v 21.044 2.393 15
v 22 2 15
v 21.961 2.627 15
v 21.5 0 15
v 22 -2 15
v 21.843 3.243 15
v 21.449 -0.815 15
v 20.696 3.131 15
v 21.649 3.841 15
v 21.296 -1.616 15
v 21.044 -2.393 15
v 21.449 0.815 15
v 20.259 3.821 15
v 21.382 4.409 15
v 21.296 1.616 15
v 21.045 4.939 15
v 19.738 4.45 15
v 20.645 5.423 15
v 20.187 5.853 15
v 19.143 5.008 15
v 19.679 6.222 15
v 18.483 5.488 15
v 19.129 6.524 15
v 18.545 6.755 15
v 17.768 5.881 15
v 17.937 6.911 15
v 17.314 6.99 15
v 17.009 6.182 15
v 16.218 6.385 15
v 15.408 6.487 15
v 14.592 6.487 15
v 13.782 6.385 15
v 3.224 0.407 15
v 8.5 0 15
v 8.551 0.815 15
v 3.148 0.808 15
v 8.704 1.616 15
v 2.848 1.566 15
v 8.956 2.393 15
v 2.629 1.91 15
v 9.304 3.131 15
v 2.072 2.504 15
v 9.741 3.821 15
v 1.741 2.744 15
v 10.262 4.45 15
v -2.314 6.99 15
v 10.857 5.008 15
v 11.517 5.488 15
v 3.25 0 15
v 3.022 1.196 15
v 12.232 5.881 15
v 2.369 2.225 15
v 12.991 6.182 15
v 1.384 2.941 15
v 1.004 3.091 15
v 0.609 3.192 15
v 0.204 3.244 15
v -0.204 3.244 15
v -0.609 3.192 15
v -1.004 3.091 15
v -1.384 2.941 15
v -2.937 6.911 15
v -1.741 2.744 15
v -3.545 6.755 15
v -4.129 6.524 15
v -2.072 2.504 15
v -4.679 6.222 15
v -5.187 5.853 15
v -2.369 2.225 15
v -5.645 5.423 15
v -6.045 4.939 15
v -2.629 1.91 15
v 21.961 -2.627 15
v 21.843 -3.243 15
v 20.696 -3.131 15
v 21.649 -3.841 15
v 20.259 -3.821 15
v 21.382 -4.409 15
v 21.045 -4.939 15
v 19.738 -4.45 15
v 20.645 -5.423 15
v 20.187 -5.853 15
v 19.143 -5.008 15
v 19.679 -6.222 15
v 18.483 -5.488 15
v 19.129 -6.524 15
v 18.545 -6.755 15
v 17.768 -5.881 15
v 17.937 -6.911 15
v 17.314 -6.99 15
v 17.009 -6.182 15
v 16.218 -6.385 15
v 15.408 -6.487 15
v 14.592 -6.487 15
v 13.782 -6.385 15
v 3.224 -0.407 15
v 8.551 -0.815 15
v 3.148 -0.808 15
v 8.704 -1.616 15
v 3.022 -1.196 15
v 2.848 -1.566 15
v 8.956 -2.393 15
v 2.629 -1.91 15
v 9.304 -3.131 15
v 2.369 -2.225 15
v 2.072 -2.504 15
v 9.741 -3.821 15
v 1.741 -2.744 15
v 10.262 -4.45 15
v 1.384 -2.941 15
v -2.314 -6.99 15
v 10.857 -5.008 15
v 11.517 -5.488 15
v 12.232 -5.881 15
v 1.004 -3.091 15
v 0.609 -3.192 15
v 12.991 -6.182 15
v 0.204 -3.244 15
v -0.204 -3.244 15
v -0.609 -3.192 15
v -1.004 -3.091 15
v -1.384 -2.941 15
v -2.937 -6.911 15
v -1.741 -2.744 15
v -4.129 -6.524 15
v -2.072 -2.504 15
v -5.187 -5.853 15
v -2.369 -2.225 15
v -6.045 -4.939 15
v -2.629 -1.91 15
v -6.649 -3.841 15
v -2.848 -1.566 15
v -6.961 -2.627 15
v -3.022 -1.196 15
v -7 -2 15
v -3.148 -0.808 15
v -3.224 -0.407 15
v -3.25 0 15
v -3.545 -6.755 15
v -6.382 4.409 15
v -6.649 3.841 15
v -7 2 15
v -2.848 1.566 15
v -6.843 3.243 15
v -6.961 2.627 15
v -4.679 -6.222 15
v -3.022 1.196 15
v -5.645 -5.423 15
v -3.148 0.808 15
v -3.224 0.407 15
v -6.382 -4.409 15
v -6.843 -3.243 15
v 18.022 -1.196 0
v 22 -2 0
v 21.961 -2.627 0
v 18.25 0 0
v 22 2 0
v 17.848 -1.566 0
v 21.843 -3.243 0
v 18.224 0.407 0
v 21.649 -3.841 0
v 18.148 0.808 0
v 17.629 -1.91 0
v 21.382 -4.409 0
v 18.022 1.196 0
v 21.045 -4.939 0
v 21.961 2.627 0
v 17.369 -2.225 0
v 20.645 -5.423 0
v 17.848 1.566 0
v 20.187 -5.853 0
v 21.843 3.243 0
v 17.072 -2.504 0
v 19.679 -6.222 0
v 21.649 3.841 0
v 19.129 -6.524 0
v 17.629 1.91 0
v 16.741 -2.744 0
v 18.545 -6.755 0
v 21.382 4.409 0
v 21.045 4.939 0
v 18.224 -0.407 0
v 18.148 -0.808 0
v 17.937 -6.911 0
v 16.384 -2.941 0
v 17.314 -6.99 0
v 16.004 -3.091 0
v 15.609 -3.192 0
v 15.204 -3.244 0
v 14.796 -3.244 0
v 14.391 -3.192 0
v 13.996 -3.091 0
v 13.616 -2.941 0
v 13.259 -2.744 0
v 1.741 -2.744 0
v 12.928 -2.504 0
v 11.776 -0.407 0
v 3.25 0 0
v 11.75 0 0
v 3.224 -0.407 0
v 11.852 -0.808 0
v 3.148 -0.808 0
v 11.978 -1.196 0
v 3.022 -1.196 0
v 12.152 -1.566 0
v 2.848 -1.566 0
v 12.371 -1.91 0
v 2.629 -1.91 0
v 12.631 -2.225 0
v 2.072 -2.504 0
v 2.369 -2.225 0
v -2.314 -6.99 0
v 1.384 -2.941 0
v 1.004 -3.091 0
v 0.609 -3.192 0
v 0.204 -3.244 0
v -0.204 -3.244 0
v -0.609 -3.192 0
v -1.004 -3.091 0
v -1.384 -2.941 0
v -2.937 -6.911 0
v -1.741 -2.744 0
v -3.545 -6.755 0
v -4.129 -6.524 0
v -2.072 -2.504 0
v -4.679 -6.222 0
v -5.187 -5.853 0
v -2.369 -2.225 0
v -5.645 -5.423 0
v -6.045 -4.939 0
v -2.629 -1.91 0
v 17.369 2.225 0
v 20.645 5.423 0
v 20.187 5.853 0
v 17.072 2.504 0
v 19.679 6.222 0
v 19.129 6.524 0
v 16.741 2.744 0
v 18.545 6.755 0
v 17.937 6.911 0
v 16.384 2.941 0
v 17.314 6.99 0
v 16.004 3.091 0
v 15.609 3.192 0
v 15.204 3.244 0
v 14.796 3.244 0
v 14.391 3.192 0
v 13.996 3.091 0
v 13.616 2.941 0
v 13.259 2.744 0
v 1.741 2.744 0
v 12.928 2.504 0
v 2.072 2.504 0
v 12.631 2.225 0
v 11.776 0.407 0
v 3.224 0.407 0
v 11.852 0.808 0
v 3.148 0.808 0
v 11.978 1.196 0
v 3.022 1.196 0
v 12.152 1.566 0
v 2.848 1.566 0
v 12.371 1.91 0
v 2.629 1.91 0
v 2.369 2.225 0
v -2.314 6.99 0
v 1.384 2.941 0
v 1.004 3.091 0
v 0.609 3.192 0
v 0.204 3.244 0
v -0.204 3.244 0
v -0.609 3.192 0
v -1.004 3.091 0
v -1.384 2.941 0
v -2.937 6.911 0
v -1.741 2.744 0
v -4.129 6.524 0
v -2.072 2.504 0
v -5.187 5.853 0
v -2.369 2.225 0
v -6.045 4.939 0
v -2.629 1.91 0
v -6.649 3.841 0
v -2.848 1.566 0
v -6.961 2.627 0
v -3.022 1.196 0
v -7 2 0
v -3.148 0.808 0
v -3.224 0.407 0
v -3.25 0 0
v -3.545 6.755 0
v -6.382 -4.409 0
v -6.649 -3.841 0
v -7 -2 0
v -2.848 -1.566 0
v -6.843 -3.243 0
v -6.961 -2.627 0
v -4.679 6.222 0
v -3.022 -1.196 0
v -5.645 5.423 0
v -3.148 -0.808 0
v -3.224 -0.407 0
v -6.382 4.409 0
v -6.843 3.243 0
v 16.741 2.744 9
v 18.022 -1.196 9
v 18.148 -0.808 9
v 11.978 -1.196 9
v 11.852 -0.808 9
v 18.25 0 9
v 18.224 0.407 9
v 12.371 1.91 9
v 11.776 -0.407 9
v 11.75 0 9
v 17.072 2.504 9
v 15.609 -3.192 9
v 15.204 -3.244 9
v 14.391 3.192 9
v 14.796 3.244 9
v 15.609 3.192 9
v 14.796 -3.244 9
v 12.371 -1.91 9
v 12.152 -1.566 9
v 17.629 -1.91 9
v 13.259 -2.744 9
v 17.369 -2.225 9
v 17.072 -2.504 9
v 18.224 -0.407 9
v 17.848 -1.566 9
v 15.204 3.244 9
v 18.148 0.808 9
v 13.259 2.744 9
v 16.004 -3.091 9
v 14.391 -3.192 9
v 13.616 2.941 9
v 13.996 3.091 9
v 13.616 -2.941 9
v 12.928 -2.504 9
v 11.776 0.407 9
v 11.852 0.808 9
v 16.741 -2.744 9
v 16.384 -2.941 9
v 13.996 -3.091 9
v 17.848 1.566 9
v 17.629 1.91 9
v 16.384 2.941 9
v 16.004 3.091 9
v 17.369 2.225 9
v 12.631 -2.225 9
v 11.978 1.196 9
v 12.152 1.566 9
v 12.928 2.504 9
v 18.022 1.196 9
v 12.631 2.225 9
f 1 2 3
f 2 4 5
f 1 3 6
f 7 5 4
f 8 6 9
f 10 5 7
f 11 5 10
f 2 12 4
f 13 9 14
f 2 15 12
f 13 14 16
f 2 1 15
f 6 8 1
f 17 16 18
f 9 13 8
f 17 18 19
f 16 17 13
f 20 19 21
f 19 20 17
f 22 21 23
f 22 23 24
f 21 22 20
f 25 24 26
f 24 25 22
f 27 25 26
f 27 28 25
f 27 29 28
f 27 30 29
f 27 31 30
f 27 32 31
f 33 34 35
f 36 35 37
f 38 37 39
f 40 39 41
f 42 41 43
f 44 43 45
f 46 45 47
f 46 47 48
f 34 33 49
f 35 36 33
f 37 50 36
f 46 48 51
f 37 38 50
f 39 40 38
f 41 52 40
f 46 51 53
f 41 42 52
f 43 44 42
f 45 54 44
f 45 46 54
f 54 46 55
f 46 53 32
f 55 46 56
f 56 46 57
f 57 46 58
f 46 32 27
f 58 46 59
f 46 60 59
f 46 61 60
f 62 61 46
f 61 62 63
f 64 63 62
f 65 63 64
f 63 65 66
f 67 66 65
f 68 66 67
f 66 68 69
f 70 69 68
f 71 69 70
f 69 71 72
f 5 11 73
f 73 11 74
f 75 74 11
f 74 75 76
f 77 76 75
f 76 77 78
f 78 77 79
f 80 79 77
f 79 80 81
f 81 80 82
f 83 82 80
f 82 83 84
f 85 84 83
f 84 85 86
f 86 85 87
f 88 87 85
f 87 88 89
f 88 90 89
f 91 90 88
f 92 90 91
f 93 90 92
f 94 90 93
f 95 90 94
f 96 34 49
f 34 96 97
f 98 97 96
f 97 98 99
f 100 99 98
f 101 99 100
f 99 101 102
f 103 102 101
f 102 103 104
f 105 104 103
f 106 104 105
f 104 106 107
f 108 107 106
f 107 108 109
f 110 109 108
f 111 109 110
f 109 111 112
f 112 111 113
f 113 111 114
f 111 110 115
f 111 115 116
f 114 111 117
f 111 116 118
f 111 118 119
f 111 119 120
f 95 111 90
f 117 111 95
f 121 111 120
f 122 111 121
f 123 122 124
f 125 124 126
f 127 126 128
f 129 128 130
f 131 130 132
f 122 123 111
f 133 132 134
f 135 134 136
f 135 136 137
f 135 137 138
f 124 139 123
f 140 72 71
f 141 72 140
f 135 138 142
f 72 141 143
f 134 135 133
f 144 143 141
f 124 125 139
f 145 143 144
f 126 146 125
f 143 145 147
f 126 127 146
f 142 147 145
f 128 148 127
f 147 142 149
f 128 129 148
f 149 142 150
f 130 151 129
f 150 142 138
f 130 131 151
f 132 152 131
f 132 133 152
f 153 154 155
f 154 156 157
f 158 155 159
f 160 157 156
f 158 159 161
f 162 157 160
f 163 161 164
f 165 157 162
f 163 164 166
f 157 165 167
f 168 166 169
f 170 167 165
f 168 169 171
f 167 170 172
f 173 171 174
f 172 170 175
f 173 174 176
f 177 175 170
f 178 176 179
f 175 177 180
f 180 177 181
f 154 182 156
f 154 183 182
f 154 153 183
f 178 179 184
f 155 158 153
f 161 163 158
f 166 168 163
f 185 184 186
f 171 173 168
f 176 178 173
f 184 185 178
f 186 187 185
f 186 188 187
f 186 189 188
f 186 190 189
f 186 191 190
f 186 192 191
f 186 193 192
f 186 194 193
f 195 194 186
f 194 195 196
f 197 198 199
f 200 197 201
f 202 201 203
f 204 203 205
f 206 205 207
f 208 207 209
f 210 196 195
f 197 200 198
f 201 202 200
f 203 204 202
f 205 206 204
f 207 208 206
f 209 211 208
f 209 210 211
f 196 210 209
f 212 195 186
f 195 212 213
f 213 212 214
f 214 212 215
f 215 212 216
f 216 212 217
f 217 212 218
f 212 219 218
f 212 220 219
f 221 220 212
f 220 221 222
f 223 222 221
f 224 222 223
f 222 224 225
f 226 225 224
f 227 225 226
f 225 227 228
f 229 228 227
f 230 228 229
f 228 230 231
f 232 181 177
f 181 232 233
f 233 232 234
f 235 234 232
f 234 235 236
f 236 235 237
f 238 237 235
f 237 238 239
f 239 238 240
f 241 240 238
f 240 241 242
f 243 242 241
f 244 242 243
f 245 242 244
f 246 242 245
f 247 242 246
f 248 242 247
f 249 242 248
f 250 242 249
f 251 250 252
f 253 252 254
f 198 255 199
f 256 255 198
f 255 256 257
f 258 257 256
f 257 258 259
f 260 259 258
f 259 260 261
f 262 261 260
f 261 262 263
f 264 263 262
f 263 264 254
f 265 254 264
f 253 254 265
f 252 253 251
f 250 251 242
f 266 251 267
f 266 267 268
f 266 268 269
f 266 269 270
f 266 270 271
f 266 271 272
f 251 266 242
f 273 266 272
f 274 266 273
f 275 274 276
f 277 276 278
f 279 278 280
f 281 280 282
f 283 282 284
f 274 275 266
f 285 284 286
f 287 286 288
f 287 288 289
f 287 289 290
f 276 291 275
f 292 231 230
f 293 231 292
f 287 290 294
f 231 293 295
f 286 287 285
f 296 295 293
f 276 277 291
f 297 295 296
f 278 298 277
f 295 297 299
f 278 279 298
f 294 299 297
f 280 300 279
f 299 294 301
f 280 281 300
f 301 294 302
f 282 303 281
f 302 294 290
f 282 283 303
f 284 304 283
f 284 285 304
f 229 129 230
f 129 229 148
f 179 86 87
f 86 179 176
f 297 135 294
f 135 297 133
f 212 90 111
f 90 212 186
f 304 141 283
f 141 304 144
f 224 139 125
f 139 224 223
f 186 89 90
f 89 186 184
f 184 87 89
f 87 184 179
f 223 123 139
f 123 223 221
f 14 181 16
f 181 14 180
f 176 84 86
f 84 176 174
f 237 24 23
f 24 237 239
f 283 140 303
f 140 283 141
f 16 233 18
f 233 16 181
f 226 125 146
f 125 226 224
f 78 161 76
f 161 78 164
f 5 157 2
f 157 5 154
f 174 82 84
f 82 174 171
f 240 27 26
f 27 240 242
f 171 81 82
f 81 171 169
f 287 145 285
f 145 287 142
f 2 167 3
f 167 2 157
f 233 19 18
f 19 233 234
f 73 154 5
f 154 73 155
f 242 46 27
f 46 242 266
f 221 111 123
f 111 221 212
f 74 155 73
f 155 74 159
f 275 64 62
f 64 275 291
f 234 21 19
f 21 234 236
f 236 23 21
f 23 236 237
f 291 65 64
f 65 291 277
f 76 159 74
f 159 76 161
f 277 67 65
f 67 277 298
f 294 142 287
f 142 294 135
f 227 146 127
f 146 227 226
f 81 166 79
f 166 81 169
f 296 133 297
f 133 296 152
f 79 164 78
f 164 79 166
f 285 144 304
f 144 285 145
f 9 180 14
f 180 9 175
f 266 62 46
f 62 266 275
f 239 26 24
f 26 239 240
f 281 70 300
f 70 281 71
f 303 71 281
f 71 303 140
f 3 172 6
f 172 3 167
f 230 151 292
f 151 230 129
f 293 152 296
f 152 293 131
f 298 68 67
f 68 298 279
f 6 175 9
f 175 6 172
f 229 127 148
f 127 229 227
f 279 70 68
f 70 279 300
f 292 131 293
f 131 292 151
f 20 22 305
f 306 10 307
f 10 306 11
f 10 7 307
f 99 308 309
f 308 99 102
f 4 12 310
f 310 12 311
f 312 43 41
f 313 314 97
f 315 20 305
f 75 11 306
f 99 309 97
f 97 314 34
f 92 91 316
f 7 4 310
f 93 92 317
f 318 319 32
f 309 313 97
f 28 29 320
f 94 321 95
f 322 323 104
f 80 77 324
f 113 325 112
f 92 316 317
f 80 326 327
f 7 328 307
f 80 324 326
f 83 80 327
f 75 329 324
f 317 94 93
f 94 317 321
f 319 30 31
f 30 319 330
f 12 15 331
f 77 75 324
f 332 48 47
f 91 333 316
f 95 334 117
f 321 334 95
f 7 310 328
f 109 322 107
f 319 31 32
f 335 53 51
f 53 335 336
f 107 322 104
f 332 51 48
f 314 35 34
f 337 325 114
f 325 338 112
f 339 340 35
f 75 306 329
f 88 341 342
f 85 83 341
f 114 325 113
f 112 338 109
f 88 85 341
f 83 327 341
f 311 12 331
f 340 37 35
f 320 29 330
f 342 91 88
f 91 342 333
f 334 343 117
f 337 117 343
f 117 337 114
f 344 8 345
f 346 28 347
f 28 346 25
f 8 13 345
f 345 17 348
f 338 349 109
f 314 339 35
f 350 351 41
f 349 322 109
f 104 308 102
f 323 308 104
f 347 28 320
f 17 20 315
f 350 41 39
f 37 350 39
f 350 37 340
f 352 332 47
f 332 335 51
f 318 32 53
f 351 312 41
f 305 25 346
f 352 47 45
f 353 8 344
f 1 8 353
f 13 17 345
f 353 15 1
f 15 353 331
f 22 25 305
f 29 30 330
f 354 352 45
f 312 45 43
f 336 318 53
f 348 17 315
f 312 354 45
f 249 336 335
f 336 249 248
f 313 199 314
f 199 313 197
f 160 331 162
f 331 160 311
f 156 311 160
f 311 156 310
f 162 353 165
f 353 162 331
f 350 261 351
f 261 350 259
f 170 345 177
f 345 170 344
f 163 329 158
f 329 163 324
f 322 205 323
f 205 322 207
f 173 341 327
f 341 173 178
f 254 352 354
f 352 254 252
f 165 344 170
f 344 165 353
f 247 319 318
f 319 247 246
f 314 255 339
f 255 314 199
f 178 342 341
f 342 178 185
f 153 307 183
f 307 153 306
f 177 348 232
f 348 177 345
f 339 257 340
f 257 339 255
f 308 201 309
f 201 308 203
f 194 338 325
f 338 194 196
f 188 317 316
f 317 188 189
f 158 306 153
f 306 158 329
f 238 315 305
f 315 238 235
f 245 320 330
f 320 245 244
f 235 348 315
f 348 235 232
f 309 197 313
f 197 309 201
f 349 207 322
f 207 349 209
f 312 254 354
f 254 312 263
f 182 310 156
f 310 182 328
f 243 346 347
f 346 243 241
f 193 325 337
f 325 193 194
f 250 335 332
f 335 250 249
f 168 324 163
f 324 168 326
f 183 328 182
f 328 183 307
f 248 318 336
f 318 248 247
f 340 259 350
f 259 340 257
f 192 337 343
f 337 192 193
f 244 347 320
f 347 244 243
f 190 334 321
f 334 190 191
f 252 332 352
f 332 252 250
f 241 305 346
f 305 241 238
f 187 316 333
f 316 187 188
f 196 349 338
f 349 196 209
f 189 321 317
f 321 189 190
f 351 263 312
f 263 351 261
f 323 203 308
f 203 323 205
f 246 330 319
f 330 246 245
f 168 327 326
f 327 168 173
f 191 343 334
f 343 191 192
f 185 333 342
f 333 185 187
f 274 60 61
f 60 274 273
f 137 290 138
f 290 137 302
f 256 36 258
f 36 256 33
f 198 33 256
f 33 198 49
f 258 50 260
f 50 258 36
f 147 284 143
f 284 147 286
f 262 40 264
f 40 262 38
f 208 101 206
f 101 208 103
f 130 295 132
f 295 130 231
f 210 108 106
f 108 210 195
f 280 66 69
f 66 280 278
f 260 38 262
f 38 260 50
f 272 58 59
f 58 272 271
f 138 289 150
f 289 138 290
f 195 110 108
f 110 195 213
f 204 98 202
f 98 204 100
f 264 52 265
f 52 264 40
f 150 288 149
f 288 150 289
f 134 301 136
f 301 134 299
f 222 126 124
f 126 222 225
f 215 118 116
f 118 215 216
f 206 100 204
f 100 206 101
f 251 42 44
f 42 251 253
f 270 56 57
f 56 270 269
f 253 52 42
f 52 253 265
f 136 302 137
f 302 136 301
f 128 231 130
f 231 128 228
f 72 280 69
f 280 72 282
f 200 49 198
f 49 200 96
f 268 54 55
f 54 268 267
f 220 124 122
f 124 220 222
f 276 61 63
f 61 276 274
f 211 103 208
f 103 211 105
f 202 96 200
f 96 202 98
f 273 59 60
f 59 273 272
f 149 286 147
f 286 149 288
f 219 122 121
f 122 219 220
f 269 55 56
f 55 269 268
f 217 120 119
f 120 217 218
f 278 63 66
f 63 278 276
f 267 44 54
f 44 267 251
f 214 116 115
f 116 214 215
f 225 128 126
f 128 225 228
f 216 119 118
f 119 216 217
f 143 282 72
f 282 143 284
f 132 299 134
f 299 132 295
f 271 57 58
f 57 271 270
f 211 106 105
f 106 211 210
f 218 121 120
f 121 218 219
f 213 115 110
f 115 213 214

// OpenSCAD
$fn = 50;


difference() {
	union() {
		cylinder(h = 15, r = 7.0000000000);
		translate(v = [7.5000000000, 0.0000000000, 0]) {
			hull() {
				translate(v = [-9.5000000000, 2.0000000000, 0]) {
					cylinder(h = 15, r = 5);
				}
				translate(v = [9.5000000000, 2.0000000000, 0]) {
					cylinder(h = 15, r = 5);
				}
				translate(v = [-9.5000000000, -2.0000000000, 0]) {
					cylinder(h = 15, r = 5);
				}
				translate(v = [9.5000000000, -2.0000000000, 0]) {
					cylinder(h = 15, r = 5);
				}
			}
		}
		translate(v = [7.5000000000, 0.0000000000, 0]) {
			hull() {
				translate(v = [-9.5000000000, 2.0000000000, 0]) {
					cylinder(h = 15, r = 5);
				}
				translate(v = [9.5000000000, 2.0000000000, 0]) {
					cylinder(h = 15, r = 5);
				}
				translate(v = [-9.5000000000, -2.0000000000, 0]) {
					cylinder(h = 15, r = 5);
				}
				translate(v = [9.5000000000, -2.0000000000, 0]) {
					cylinder(h = 15, r = 5);
				}
			}
		}
	}
	union() {
		translate(v = [15.0000000000, 0.0000000000, 15]) {
			rotate(a = [0, 0, 0]) {
				difference() {
					union() {
						#translate(v = [0, 0, -15.0000000000]) {
							cylinder(h = 15, r = 2.2500000000);
						}
						#translate(v = [0, 0, -6]) {
							cylinder(h = 6, r1 = 3.2500000000, r2 = 6.5000000000);
						}
						#translate(v = [0, 0, -15.0000000000]) {
							cylinder(h = 15, r = 3.2500000000);
						}
						#translate(v = [0, 0, -15.0000000000]) {
							cylinder(h = 15, r = 2.2500000000);
						}
					}
					union();
				}
			}
		}
		translate(v = [15.0000000000, 0.0000000000, 15]) {
			rotate(a = [0, 0, 0]) {
				difference() {
					union() {
						#translate(v = [0, 0, -15.0000000000]) {
							cylinder(h = 15, r = 2.2500000000);
						}
						#translate(v = [0, 0, -6]) {
							cylinder(h = 6, r1 = 3.2500000000, r2 = 6.5000000000);
						}
						#translate(v = [0, 0, -15.0000000000]) {
							cylinder(h = 15, r = 3.2500000000);
						}
						#translate(v = [0, 0, -15.0000000000]) {
							cylinder(h = 15, r = 2.2500000000);
						}
					}
					union();
				}
			}
		}
		translate(v = [0, 0, -100]) {
			cylinder(h = 200, r = 3.2500000000);
		}
		translate(v = [0, 0, -100]) {
			cylinder(h = 200, r = 1.8000000000);
		}
	}
}
